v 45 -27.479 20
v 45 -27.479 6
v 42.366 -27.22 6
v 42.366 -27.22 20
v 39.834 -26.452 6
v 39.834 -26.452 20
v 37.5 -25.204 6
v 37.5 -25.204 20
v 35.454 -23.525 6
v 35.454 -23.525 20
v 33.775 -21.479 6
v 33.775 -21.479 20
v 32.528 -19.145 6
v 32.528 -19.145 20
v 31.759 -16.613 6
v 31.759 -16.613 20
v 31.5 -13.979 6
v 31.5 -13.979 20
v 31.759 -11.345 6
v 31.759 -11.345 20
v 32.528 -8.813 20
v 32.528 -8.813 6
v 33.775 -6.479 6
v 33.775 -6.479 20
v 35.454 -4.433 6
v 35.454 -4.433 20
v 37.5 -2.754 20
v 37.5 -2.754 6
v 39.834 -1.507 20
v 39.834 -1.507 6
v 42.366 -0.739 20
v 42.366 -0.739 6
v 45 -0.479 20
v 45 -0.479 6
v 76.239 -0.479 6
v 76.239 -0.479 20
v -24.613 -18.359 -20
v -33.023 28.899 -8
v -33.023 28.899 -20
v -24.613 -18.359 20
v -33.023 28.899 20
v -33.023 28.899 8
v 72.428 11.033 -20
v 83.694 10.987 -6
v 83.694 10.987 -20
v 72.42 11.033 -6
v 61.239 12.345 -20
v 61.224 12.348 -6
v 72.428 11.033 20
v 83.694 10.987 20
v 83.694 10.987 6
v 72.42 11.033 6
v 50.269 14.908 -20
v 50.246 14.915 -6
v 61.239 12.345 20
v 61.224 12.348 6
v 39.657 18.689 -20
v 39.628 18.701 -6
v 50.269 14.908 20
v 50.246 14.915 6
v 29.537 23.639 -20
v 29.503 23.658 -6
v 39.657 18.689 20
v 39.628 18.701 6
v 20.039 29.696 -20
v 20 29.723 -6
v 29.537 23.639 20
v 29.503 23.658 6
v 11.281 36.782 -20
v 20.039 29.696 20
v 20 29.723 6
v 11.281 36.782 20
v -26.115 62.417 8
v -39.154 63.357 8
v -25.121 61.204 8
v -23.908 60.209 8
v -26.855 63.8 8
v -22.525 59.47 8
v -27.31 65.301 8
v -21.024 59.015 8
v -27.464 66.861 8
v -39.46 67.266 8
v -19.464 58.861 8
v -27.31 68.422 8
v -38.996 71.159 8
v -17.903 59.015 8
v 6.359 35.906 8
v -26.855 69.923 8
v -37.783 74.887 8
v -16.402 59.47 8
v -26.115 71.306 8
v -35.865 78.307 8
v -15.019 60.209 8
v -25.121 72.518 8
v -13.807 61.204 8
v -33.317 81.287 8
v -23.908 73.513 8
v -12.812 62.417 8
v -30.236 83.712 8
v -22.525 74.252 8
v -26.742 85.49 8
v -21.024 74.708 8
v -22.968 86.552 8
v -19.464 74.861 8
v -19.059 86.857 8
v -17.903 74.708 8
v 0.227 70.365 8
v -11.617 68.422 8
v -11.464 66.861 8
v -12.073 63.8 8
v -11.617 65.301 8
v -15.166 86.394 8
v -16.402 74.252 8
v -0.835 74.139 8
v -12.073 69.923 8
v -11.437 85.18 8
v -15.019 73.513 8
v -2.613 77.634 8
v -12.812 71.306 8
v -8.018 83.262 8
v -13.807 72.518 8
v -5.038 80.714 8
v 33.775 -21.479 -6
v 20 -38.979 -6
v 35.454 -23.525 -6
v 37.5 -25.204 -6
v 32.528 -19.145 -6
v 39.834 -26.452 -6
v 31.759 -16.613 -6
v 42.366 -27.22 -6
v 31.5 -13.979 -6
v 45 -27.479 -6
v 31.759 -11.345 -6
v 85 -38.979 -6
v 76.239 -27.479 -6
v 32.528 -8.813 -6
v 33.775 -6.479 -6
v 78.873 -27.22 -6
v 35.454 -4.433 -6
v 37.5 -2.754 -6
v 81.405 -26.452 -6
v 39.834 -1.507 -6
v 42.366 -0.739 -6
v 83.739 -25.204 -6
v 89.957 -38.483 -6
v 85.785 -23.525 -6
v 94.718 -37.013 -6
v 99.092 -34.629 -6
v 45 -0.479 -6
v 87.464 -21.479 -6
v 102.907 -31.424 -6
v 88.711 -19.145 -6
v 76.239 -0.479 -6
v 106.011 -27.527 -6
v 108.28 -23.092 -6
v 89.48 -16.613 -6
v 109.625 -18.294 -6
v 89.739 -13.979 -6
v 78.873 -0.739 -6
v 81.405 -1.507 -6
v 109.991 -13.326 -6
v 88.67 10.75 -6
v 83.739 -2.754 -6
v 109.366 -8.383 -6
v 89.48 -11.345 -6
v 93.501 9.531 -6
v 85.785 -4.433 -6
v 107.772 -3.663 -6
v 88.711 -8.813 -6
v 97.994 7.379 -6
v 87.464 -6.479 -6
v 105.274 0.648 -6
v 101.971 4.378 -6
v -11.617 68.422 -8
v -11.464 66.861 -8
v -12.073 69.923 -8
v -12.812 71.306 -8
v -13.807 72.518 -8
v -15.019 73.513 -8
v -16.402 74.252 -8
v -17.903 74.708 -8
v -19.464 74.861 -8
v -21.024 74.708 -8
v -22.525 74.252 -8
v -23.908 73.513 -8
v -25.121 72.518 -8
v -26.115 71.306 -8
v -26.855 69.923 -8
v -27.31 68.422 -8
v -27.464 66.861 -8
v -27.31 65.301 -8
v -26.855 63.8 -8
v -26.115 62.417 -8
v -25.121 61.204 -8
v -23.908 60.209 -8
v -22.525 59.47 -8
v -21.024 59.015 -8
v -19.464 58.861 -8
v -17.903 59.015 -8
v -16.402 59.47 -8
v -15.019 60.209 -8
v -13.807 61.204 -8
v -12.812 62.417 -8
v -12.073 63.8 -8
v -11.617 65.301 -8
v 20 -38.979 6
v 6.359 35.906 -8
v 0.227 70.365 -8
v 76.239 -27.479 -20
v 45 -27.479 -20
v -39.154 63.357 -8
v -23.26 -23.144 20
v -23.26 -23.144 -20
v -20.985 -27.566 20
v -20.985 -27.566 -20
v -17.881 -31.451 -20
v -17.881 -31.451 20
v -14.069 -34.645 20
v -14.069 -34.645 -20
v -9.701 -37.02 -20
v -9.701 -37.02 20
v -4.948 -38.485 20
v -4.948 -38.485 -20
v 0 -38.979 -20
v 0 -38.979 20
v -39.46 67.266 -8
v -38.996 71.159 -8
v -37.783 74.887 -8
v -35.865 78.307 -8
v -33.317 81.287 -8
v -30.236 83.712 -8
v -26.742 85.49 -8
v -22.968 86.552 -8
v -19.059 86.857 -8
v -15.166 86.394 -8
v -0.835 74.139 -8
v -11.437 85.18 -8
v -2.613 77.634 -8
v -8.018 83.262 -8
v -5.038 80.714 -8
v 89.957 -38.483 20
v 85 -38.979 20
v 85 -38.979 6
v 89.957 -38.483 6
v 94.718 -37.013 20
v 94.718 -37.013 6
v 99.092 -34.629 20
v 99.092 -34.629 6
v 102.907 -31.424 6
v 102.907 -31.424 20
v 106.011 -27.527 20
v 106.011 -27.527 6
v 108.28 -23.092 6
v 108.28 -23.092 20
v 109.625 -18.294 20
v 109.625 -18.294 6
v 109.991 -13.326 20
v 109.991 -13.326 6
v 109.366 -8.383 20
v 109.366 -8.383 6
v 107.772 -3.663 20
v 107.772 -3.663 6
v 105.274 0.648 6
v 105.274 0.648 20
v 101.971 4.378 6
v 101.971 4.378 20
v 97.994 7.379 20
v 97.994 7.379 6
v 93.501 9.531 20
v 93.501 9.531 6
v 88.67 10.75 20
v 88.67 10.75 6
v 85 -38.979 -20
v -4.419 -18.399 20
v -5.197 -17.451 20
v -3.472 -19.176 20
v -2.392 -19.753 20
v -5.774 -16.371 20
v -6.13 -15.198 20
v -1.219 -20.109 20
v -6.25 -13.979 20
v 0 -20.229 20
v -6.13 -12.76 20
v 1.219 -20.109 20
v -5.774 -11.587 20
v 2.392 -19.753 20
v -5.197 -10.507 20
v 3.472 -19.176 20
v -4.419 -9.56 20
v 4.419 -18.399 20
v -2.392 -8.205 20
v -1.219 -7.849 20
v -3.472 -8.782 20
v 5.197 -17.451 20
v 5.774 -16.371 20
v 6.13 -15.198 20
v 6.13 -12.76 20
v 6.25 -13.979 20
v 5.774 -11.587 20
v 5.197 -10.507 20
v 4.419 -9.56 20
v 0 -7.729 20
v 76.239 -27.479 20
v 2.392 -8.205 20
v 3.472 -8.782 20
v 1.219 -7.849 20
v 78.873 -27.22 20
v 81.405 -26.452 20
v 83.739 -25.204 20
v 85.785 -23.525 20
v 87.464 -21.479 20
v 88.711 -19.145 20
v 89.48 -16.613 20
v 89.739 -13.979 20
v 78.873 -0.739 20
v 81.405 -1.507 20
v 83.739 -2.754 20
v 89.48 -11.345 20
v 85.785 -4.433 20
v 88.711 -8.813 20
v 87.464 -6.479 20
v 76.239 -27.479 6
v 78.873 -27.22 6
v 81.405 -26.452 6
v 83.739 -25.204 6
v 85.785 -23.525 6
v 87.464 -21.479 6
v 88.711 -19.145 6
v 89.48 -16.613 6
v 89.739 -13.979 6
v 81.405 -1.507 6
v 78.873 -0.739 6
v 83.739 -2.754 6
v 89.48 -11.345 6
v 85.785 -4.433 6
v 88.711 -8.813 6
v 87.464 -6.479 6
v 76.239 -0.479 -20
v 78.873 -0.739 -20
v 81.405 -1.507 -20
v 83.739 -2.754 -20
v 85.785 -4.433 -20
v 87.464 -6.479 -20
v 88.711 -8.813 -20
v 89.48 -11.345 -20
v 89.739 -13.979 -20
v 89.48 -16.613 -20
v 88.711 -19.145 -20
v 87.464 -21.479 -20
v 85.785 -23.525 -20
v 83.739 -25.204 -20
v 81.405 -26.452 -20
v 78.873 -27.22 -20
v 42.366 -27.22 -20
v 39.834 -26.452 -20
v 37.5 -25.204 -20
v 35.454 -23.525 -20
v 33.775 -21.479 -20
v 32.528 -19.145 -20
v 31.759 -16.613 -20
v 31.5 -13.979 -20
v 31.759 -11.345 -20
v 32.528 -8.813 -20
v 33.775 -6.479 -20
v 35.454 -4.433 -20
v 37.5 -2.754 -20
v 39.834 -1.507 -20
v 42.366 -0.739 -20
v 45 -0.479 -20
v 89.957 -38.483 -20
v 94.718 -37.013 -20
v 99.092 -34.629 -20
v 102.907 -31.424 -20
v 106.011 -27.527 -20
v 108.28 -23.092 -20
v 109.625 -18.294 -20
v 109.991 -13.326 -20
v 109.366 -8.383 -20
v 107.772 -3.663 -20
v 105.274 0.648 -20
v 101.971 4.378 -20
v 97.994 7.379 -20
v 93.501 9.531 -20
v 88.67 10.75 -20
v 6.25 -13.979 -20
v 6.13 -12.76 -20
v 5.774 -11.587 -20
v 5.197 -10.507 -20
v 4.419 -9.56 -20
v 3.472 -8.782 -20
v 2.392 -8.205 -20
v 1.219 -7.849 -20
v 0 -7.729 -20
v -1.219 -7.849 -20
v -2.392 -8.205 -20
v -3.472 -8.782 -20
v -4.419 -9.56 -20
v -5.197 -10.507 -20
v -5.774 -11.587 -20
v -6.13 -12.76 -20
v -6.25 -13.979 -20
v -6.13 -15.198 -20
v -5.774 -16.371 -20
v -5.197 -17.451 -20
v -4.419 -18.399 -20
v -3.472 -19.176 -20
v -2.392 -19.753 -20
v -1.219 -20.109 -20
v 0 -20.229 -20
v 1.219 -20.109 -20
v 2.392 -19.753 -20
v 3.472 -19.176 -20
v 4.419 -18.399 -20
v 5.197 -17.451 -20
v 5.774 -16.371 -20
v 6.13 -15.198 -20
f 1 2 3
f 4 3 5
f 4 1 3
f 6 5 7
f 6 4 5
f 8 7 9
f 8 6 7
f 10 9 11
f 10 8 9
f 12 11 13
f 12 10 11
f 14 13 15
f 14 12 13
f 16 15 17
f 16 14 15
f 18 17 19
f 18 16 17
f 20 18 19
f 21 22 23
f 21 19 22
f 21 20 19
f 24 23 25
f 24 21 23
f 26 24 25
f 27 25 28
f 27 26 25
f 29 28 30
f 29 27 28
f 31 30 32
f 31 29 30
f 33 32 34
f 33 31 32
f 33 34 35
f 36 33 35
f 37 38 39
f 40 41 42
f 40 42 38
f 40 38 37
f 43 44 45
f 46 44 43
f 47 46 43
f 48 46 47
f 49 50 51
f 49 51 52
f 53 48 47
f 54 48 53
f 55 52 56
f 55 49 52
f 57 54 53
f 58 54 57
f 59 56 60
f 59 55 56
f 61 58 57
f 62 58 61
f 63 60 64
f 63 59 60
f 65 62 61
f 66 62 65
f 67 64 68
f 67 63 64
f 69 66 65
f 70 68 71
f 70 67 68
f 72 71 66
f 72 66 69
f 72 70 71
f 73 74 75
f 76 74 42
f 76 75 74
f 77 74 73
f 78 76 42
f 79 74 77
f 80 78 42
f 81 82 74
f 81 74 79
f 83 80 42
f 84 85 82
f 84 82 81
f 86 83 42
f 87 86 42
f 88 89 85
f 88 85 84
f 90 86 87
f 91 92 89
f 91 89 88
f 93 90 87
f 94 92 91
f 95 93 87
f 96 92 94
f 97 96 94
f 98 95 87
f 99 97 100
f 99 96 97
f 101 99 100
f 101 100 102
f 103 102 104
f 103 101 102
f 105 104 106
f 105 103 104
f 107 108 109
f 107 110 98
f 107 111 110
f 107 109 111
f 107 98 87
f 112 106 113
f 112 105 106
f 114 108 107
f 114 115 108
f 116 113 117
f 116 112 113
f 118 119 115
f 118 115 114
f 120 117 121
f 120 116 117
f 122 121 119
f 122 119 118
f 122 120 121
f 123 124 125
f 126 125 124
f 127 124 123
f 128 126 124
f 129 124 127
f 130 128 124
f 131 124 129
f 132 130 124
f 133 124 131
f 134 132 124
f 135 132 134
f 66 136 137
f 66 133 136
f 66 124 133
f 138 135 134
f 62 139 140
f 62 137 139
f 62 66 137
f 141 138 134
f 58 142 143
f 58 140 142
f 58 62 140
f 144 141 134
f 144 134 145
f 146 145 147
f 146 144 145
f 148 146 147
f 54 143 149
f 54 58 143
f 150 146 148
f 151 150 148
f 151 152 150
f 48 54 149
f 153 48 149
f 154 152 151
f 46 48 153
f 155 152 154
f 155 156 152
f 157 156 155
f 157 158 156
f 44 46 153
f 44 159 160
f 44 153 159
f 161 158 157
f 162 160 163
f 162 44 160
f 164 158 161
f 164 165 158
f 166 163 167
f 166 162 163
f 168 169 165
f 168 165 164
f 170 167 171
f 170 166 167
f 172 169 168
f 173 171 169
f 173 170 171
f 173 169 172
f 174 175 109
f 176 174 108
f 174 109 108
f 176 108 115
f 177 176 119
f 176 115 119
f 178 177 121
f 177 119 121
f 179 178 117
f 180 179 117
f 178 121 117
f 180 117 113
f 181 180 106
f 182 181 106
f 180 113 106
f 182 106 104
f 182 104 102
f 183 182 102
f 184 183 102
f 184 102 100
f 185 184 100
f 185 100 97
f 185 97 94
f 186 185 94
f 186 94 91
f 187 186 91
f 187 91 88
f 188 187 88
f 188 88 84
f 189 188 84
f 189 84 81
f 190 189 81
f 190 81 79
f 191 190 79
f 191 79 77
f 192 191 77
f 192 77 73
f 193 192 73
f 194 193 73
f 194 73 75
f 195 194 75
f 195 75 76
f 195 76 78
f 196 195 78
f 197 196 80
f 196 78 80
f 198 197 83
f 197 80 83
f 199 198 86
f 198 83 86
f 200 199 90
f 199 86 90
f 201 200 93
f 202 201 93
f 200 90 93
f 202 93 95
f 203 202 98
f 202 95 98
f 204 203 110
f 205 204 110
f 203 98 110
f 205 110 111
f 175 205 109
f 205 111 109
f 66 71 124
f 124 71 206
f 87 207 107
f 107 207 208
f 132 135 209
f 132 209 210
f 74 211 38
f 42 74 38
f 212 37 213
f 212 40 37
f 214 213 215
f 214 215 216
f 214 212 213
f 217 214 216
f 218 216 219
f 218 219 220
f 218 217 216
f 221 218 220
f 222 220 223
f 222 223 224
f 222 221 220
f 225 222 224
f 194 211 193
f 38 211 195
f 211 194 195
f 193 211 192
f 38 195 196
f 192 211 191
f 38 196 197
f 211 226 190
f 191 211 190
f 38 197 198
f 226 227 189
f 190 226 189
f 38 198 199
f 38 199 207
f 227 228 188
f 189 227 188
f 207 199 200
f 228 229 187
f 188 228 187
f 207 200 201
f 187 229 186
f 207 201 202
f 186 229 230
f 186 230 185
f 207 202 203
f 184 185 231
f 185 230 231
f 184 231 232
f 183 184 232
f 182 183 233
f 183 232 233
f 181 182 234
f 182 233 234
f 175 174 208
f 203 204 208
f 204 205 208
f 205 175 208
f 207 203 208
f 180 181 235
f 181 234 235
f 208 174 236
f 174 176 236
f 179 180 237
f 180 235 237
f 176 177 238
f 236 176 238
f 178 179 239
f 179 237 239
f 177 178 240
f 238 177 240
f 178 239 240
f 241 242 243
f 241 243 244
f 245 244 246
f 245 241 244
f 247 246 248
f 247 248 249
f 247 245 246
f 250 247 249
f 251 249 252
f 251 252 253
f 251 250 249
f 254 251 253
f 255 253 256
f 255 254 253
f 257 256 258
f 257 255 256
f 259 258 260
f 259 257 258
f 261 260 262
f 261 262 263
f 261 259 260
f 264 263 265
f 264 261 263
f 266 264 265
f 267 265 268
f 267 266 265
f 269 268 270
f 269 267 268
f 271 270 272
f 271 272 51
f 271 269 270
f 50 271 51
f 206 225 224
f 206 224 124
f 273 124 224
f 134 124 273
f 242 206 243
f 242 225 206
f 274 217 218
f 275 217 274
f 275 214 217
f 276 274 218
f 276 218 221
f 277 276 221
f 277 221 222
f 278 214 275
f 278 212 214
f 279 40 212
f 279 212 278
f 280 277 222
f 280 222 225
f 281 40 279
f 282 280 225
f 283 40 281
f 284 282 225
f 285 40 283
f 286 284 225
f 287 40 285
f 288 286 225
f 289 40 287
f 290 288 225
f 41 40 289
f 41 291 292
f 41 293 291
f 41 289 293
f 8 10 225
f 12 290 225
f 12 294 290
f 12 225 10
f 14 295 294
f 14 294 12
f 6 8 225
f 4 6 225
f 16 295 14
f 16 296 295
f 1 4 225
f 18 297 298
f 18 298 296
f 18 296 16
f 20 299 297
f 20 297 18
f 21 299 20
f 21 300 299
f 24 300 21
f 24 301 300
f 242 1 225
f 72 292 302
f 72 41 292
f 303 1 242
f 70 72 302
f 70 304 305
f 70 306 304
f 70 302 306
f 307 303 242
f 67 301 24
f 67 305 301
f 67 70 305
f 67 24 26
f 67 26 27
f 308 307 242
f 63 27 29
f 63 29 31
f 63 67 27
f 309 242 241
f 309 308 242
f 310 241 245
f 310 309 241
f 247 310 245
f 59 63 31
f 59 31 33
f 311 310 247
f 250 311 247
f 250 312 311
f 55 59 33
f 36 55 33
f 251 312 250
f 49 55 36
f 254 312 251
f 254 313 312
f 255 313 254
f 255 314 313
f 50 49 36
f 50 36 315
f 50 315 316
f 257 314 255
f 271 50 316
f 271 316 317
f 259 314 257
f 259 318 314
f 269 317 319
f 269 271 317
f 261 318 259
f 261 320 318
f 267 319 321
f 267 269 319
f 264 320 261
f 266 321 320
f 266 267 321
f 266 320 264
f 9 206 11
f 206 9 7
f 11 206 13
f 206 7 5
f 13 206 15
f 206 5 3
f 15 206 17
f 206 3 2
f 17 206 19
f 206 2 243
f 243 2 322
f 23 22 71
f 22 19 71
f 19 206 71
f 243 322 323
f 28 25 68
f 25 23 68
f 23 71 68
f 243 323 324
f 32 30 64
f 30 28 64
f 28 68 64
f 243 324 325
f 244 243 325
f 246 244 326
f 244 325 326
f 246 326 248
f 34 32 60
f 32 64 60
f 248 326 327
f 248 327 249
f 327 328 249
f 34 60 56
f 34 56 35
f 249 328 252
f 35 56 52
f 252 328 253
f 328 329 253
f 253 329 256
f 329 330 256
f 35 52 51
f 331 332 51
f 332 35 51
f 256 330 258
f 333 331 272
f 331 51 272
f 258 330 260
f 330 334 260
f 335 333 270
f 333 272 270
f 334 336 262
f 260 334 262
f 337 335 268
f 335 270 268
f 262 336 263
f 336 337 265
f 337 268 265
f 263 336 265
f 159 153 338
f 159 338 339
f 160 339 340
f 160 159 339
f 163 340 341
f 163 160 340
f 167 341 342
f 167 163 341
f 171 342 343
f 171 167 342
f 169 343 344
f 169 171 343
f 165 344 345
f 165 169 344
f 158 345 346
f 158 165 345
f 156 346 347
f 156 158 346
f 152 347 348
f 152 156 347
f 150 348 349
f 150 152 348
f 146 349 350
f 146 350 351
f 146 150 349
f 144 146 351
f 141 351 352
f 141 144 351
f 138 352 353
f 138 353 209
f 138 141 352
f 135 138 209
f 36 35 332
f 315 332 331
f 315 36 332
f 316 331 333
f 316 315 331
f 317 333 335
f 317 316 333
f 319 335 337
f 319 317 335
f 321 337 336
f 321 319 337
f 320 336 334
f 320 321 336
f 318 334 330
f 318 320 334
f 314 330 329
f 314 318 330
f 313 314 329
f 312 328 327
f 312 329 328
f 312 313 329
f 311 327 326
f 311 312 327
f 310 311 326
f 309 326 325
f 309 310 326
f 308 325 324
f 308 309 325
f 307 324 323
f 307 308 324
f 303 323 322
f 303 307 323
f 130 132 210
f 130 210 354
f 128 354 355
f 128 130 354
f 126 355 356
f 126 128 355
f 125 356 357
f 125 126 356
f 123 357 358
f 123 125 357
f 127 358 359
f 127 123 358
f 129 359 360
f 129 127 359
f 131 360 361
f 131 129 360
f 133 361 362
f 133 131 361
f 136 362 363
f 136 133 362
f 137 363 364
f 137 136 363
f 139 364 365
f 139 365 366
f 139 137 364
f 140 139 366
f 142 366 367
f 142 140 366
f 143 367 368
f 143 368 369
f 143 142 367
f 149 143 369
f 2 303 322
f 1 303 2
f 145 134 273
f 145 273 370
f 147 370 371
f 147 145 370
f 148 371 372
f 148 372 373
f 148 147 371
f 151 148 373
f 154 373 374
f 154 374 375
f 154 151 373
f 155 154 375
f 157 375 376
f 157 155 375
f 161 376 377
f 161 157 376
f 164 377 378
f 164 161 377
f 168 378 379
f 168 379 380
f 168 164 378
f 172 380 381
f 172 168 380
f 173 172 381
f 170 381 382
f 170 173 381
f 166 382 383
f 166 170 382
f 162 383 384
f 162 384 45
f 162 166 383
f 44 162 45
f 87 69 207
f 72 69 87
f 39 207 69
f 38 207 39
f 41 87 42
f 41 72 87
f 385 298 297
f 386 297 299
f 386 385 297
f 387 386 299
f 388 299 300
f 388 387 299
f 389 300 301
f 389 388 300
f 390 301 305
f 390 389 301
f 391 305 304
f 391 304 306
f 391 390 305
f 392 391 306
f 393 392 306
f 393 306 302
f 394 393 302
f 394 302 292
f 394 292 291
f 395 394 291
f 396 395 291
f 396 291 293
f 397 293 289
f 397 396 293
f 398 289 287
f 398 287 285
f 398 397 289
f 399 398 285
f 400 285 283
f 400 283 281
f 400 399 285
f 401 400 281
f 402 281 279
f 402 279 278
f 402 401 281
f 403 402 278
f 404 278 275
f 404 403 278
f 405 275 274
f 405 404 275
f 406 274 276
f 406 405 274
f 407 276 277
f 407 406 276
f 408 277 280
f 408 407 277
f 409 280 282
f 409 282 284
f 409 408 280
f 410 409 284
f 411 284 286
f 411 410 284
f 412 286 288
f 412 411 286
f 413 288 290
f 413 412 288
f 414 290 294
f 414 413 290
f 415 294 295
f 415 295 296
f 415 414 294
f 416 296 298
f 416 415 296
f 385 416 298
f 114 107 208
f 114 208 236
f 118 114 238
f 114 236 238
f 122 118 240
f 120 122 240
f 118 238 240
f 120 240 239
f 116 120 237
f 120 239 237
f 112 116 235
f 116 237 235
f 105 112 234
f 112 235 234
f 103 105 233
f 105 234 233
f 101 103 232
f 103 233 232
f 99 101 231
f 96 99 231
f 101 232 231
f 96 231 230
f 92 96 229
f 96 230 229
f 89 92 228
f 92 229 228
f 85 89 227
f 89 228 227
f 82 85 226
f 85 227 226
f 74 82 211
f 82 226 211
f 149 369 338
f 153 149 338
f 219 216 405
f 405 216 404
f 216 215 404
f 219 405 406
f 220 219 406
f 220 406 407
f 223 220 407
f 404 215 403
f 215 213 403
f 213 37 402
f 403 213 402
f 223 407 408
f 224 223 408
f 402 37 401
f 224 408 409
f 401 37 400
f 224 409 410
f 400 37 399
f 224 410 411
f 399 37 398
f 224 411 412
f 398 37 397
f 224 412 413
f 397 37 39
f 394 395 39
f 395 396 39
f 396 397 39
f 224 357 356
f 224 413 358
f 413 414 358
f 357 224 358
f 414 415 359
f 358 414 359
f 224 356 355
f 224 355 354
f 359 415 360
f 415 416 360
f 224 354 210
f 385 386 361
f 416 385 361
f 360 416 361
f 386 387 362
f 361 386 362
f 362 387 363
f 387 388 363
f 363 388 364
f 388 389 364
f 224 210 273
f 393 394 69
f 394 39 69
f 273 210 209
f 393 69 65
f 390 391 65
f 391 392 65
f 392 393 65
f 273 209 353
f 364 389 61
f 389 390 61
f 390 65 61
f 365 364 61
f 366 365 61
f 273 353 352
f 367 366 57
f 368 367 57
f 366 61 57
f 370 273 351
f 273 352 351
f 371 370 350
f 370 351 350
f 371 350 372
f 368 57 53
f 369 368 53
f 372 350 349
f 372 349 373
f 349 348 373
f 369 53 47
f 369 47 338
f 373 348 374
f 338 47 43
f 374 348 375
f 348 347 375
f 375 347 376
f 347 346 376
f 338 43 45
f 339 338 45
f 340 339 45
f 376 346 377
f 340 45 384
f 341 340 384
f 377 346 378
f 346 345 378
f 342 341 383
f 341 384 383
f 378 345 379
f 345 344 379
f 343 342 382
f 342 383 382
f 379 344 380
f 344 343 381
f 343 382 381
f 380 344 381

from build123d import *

# Parameters (mm, degrees)
SKETCH1_R                = 6.25
BOSS_EXTRUDE1_DEPTH      = 20
CUT_EXTRUDE2_DEPTH       = 6
BOSS_EXTRUDE2_DEPTH      = 8
BOSS_EXTRUDE2_DEPTH_BACK = 8
SKETCH8_R                = 8
CUT_EXTRUDE3_DEPTH       = 143.929611875


with BuildPart() as part:
    # Sketch1 → Boss-Extrude1 (new, symmetric)
    with BuildSketch(Plane.XY):
        with BuildLine():
            Line((0, -38.979129488), (85, -38.979129488))
            ThreePointArc((85, -38.979129488), (109.991458118, -13.325660942), (83.693509457, 10.986708821))
            ThreePointArc((83.693509457, 10.986708821), (44.909838533, 16.648787206), (11.281411091, 36.782369345))
            Line((11.281411091, 36.782369345), (-33.022622734, 28.898678149))
            Line((-33.022622734, 28.898678149), (-24.613352125, -18.35895793))
            ThreePointArc((-24.613352125, -18.35895793), (-16.054661145, -33.142841433), (0, -38.979129488))
        make_face()
        with Locations((0, -13.979129488)):
            Circle(SKETCH1_R, mode=Mode.SUBTRACT)
        with BuildLine():
            Line((45, -0.479129488), (76.239117398, -0.479129488))
            ThreePointArc((76.239117398, -0.479129488), (89.739117398, -13.979129488), (76.239117398, -27.479129488))
            Line((76.239117398, -27.479129488), (45, -27.479129488))
            ThreePointArc((45, -27.479129488), (31.5, -13.979129488), (45, -0.479129488))
        make_face(mode=Mode.SUBTRACT)
    extrude(amount=BOSS_EXTRUDE1_DEPTH, both=True)

    # Sketch5 → Cut-Extrude2 (cut, symmetric)
    with BuildSketch(Plane.XY):
        with BuildLine():
            Line((20, 29.723334557), (20, -38.979129488))
            Line((20, -38.979129488), (85, -38.979129488))
            ThreePointArc((85, -38.979129488), (109.991458118, -13.325660942), (83.693509457, 10.986708821))
            ThreePointArc((83.693509457, 10.986708821), (50.246422532, 14.914833293), (20, 29.723334557))
        make_face()
    extrude(amount=CUT_EXTRUDE2_DEPTH, both=True, mode=Mode.SUBTRACT)

    # Sketch7 → Boss-Extrude2 (add, two sides: drawn at the far end of the back side and taken through both)
    with BuildSketch(Plane.XY.offset(-BOSS_EXTRUDE2_DEPTH_BACK)):
        with BuildLine():
            Line((-33.022622734, 28.898678149), (6.358740666, 35.906403657))
            Line((6.358740666, 35.906403657), (0.226980847, 70.365096632))
            ThreePointArc((0.226980847, 70.365096632), (0.458819494, 68.619978601), (0.536299147, 66.861233878))
            ThreePointArc((0.536299147, 66.861233878), (-17.70495613, 46.93871353), (-39.154382553, 63.357371124))
            Line((-39.154382553, 63.357371124), (-33.022622734, 28.898678149))
        make_face()
        with BuildLine():
            ThreePointArc((0.536299147, 66.861233878), (0.458819494, 68.619978601), (0.226980847, 70.365096632))
            Line((0.226980847, 70.365096632), (-39.154382553, 63.357371124))
            ThreePointArc((-39.154382553, 63.357371124), (-17.70495613, 46.93871353), (0.536299147, 66.861233878))
        make_face()
        with BuildLine():
            Line((-39.154382553, 63.357371124), (0.226980847, 70.365096632))
            ThreePointArc((0.226980847, 70.365096632), (-22.967563607, 86.551915578), (-39.154382553, 63.357371124))
        make_face()
    extrude(amount=BOSS_EXTRUDE2_DEPTH + BOSS_EXTRUDE2_DEPTH_BACK)

    # Sketch8 → Cut-Extrude3 (cut, through all)
    with BuildSketch(Plane.XY.offset(8)):
        with Locations((-19.463700853, 66.861233878)):
            Circle(SKETCH8_R)
    extrude(amount=-CUT_EXTRUDE3_DEPTH, mode=Mode.SUBTRACT)


solid = part.part
